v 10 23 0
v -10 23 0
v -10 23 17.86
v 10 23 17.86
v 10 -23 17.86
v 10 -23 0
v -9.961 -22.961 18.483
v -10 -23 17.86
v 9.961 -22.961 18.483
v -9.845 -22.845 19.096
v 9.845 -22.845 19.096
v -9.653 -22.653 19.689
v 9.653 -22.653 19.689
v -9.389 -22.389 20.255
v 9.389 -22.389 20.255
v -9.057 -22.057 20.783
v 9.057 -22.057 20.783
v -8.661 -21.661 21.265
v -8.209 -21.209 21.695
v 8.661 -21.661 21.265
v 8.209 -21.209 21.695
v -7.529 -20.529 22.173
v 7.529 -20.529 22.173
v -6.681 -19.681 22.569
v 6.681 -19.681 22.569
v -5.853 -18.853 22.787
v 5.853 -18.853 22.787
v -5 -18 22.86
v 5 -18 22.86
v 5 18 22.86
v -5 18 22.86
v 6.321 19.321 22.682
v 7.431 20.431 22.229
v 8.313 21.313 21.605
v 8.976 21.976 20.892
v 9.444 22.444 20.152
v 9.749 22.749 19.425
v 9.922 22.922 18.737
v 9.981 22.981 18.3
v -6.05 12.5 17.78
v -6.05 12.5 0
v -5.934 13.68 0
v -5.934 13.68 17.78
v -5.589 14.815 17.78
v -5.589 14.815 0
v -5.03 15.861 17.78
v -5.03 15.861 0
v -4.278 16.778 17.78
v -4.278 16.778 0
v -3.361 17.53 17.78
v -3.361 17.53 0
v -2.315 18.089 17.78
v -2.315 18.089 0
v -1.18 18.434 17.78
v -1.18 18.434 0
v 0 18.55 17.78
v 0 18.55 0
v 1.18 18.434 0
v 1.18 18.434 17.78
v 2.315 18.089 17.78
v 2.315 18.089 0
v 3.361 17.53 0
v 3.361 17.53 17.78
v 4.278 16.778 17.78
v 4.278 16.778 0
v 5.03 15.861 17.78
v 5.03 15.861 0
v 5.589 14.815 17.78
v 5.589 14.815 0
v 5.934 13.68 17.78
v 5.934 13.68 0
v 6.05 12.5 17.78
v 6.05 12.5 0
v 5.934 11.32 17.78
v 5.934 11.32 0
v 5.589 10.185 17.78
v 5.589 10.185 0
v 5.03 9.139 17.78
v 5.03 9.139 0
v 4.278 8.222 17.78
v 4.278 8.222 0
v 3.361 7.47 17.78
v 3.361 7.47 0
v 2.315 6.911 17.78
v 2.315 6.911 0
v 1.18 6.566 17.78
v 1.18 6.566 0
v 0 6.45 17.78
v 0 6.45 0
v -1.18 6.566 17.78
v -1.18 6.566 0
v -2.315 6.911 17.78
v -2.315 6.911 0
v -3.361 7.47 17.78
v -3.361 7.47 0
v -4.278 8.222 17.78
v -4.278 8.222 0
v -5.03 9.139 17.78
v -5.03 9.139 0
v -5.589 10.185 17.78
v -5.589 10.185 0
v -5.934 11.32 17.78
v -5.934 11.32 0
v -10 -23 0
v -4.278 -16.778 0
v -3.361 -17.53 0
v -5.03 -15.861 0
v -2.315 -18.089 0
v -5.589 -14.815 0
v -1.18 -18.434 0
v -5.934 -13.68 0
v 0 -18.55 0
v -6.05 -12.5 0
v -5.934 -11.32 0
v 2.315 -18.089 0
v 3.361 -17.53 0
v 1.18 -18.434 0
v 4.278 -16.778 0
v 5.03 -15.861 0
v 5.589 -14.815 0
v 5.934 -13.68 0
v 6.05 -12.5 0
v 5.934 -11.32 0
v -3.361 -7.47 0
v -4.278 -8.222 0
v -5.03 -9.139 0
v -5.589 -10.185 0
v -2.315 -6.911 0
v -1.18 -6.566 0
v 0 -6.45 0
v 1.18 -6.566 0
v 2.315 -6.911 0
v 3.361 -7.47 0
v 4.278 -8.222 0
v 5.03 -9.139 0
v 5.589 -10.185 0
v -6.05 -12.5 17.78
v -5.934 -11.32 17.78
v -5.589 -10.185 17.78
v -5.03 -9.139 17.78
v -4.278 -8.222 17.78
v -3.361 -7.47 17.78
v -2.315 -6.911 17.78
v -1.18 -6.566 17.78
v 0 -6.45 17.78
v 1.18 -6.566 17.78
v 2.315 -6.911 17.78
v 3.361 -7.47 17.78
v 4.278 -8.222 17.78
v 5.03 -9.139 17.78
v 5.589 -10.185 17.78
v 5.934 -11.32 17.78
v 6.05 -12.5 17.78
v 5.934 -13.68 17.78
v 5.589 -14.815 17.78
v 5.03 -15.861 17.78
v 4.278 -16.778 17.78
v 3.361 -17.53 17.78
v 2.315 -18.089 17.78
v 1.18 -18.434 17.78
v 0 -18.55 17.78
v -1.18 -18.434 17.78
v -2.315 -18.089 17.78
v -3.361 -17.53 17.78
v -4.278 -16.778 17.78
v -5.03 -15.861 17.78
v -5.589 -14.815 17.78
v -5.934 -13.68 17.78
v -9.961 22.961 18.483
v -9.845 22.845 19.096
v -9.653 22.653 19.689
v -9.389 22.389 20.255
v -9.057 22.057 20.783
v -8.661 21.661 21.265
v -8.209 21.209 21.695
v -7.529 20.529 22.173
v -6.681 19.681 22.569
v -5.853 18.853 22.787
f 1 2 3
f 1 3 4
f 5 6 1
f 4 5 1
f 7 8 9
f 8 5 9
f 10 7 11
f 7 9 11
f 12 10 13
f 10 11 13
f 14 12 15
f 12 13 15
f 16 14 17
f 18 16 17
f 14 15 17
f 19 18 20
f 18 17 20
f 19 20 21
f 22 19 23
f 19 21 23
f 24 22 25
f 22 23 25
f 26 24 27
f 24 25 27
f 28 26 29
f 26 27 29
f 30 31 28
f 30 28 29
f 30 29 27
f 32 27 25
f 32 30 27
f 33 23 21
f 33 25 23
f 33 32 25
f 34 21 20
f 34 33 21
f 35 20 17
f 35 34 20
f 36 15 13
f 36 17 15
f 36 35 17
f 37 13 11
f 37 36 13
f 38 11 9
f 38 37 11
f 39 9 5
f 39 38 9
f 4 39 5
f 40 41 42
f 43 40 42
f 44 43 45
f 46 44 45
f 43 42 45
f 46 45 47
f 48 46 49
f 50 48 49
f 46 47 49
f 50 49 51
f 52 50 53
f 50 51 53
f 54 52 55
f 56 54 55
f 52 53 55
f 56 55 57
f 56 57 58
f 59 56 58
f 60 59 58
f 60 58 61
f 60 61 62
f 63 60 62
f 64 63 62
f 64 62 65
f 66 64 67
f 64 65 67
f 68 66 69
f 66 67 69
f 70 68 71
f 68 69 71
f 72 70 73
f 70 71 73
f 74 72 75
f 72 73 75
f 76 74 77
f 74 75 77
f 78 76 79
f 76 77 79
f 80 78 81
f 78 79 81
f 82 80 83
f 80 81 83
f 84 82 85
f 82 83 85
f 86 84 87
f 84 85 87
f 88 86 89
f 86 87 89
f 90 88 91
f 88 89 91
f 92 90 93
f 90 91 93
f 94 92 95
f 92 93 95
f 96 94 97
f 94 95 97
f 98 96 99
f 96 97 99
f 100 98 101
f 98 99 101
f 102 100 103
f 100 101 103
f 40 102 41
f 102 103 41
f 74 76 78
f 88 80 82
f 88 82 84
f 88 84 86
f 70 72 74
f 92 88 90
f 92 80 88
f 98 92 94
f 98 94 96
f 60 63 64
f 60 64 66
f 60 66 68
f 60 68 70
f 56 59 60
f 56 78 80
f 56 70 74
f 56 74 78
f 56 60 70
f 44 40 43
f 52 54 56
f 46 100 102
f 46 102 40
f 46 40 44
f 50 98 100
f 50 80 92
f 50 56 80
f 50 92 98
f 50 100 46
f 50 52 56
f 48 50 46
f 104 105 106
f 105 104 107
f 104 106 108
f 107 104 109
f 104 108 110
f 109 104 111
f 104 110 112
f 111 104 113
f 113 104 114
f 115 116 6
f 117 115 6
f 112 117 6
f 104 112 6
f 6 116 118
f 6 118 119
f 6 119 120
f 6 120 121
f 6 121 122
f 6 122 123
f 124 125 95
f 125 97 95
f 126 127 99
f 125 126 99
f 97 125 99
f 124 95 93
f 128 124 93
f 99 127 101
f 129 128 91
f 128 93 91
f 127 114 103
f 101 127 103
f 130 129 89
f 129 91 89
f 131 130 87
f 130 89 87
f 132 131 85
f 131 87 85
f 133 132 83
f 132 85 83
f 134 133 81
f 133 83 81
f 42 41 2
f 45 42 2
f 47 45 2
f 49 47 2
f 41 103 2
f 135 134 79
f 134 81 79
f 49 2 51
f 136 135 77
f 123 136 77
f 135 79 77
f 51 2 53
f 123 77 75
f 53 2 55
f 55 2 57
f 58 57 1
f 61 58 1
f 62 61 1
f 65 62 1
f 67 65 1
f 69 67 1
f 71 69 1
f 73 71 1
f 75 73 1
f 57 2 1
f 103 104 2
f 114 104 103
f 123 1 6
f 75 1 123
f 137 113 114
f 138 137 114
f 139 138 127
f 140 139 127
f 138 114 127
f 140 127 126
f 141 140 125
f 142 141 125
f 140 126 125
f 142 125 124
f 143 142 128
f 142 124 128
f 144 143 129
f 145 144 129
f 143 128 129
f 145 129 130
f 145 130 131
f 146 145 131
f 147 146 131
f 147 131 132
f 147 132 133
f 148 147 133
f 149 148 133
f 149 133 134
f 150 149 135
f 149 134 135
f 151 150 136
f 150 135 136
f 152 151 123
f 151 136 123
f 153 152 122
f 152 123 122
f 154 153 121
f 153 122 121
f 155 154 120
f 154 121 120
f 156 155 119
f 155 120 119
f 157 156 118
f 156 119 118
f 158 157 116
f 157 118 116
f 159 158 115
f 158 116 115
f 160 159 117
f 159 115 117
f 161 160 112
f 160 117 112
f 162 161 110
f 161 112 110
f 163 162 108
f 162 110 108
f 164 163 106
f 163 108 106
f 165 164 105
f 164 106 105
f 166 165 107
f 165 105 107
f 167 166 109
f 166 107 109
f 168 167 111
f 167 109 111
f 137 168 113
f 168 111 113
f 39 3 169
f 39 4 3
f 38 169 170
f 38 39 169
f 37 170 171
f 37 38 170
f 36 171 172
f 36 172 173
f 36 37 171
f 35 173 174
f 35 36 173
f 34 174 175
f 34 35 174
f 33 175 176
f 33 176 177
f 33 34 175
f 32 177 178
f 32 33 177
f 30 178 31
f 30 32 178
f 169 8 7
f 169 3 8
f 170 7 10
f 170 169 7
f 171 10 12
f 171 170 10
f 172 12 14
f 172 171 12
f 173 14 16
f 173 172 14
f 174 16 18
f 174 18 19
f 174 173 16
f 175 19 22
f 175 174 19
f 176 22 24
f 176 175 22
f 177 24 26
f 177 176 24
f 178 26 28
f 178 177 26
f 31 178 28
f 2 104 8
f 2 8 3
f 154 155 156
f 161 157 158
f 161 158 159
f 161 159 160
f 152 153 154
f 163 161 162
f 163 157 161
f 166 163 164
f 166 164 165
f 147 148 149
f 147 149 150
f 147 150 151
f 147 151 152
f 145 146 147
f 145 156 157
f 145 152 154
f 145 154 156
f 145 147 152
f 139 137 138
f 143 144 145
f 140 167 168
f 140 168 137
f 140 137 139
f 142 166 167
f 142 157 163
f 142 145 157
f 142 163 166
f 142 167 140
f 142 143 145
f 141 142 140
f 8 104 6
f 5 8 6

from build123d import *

# Parameters (mm, degrees)
SKETCH1_W           = 20
SKETCH1_H           = 46
BOSS_EXTRUDE1_DEPTH = 22.86
SKETCH2_R           = 6.05
CUT_EXTRUDE1_DEPTH  = 17.78
FILLET1_R           = 5


with BuildPart() as part:
    # Sketch1 → Boss-Extrude1 (new body)
    with BuildSketch(Plane.XY):
        Rectangle(SKETCH1_W, SKETCH1_H)
    extrude(amount=BOSS_EXTRUDE1_DEPTH)

    # Sketch2 → Cut-Extrude1 (cut)
    with BuildSketch(Plane(origin=(0, 0, 0), x_dir=(-1, 0, 0), z_dir=(0, 0, -1))):
        with Locations((0, 12.5)):
            Circle(SKETCH2_R)
        with Locations((0, -12.5)):
            Circle(SKETCH2_R)
    extrude(amount=-CUT_EXTRUDE1_DEPTH, mode=Mode.SUBTRACT)

    # Fillet1
    fillet1_edges = [part.edges().sort_by_distance(p)[0] for p in [
        (-10, 0, 22.86),
        (0, -23, 22.86),
        (10, 0, 22.86),
        (0, 23, 22.86),
    ]]
    fillet(fillet1_edges, radius=FILLET1_R)


solid = part.part
